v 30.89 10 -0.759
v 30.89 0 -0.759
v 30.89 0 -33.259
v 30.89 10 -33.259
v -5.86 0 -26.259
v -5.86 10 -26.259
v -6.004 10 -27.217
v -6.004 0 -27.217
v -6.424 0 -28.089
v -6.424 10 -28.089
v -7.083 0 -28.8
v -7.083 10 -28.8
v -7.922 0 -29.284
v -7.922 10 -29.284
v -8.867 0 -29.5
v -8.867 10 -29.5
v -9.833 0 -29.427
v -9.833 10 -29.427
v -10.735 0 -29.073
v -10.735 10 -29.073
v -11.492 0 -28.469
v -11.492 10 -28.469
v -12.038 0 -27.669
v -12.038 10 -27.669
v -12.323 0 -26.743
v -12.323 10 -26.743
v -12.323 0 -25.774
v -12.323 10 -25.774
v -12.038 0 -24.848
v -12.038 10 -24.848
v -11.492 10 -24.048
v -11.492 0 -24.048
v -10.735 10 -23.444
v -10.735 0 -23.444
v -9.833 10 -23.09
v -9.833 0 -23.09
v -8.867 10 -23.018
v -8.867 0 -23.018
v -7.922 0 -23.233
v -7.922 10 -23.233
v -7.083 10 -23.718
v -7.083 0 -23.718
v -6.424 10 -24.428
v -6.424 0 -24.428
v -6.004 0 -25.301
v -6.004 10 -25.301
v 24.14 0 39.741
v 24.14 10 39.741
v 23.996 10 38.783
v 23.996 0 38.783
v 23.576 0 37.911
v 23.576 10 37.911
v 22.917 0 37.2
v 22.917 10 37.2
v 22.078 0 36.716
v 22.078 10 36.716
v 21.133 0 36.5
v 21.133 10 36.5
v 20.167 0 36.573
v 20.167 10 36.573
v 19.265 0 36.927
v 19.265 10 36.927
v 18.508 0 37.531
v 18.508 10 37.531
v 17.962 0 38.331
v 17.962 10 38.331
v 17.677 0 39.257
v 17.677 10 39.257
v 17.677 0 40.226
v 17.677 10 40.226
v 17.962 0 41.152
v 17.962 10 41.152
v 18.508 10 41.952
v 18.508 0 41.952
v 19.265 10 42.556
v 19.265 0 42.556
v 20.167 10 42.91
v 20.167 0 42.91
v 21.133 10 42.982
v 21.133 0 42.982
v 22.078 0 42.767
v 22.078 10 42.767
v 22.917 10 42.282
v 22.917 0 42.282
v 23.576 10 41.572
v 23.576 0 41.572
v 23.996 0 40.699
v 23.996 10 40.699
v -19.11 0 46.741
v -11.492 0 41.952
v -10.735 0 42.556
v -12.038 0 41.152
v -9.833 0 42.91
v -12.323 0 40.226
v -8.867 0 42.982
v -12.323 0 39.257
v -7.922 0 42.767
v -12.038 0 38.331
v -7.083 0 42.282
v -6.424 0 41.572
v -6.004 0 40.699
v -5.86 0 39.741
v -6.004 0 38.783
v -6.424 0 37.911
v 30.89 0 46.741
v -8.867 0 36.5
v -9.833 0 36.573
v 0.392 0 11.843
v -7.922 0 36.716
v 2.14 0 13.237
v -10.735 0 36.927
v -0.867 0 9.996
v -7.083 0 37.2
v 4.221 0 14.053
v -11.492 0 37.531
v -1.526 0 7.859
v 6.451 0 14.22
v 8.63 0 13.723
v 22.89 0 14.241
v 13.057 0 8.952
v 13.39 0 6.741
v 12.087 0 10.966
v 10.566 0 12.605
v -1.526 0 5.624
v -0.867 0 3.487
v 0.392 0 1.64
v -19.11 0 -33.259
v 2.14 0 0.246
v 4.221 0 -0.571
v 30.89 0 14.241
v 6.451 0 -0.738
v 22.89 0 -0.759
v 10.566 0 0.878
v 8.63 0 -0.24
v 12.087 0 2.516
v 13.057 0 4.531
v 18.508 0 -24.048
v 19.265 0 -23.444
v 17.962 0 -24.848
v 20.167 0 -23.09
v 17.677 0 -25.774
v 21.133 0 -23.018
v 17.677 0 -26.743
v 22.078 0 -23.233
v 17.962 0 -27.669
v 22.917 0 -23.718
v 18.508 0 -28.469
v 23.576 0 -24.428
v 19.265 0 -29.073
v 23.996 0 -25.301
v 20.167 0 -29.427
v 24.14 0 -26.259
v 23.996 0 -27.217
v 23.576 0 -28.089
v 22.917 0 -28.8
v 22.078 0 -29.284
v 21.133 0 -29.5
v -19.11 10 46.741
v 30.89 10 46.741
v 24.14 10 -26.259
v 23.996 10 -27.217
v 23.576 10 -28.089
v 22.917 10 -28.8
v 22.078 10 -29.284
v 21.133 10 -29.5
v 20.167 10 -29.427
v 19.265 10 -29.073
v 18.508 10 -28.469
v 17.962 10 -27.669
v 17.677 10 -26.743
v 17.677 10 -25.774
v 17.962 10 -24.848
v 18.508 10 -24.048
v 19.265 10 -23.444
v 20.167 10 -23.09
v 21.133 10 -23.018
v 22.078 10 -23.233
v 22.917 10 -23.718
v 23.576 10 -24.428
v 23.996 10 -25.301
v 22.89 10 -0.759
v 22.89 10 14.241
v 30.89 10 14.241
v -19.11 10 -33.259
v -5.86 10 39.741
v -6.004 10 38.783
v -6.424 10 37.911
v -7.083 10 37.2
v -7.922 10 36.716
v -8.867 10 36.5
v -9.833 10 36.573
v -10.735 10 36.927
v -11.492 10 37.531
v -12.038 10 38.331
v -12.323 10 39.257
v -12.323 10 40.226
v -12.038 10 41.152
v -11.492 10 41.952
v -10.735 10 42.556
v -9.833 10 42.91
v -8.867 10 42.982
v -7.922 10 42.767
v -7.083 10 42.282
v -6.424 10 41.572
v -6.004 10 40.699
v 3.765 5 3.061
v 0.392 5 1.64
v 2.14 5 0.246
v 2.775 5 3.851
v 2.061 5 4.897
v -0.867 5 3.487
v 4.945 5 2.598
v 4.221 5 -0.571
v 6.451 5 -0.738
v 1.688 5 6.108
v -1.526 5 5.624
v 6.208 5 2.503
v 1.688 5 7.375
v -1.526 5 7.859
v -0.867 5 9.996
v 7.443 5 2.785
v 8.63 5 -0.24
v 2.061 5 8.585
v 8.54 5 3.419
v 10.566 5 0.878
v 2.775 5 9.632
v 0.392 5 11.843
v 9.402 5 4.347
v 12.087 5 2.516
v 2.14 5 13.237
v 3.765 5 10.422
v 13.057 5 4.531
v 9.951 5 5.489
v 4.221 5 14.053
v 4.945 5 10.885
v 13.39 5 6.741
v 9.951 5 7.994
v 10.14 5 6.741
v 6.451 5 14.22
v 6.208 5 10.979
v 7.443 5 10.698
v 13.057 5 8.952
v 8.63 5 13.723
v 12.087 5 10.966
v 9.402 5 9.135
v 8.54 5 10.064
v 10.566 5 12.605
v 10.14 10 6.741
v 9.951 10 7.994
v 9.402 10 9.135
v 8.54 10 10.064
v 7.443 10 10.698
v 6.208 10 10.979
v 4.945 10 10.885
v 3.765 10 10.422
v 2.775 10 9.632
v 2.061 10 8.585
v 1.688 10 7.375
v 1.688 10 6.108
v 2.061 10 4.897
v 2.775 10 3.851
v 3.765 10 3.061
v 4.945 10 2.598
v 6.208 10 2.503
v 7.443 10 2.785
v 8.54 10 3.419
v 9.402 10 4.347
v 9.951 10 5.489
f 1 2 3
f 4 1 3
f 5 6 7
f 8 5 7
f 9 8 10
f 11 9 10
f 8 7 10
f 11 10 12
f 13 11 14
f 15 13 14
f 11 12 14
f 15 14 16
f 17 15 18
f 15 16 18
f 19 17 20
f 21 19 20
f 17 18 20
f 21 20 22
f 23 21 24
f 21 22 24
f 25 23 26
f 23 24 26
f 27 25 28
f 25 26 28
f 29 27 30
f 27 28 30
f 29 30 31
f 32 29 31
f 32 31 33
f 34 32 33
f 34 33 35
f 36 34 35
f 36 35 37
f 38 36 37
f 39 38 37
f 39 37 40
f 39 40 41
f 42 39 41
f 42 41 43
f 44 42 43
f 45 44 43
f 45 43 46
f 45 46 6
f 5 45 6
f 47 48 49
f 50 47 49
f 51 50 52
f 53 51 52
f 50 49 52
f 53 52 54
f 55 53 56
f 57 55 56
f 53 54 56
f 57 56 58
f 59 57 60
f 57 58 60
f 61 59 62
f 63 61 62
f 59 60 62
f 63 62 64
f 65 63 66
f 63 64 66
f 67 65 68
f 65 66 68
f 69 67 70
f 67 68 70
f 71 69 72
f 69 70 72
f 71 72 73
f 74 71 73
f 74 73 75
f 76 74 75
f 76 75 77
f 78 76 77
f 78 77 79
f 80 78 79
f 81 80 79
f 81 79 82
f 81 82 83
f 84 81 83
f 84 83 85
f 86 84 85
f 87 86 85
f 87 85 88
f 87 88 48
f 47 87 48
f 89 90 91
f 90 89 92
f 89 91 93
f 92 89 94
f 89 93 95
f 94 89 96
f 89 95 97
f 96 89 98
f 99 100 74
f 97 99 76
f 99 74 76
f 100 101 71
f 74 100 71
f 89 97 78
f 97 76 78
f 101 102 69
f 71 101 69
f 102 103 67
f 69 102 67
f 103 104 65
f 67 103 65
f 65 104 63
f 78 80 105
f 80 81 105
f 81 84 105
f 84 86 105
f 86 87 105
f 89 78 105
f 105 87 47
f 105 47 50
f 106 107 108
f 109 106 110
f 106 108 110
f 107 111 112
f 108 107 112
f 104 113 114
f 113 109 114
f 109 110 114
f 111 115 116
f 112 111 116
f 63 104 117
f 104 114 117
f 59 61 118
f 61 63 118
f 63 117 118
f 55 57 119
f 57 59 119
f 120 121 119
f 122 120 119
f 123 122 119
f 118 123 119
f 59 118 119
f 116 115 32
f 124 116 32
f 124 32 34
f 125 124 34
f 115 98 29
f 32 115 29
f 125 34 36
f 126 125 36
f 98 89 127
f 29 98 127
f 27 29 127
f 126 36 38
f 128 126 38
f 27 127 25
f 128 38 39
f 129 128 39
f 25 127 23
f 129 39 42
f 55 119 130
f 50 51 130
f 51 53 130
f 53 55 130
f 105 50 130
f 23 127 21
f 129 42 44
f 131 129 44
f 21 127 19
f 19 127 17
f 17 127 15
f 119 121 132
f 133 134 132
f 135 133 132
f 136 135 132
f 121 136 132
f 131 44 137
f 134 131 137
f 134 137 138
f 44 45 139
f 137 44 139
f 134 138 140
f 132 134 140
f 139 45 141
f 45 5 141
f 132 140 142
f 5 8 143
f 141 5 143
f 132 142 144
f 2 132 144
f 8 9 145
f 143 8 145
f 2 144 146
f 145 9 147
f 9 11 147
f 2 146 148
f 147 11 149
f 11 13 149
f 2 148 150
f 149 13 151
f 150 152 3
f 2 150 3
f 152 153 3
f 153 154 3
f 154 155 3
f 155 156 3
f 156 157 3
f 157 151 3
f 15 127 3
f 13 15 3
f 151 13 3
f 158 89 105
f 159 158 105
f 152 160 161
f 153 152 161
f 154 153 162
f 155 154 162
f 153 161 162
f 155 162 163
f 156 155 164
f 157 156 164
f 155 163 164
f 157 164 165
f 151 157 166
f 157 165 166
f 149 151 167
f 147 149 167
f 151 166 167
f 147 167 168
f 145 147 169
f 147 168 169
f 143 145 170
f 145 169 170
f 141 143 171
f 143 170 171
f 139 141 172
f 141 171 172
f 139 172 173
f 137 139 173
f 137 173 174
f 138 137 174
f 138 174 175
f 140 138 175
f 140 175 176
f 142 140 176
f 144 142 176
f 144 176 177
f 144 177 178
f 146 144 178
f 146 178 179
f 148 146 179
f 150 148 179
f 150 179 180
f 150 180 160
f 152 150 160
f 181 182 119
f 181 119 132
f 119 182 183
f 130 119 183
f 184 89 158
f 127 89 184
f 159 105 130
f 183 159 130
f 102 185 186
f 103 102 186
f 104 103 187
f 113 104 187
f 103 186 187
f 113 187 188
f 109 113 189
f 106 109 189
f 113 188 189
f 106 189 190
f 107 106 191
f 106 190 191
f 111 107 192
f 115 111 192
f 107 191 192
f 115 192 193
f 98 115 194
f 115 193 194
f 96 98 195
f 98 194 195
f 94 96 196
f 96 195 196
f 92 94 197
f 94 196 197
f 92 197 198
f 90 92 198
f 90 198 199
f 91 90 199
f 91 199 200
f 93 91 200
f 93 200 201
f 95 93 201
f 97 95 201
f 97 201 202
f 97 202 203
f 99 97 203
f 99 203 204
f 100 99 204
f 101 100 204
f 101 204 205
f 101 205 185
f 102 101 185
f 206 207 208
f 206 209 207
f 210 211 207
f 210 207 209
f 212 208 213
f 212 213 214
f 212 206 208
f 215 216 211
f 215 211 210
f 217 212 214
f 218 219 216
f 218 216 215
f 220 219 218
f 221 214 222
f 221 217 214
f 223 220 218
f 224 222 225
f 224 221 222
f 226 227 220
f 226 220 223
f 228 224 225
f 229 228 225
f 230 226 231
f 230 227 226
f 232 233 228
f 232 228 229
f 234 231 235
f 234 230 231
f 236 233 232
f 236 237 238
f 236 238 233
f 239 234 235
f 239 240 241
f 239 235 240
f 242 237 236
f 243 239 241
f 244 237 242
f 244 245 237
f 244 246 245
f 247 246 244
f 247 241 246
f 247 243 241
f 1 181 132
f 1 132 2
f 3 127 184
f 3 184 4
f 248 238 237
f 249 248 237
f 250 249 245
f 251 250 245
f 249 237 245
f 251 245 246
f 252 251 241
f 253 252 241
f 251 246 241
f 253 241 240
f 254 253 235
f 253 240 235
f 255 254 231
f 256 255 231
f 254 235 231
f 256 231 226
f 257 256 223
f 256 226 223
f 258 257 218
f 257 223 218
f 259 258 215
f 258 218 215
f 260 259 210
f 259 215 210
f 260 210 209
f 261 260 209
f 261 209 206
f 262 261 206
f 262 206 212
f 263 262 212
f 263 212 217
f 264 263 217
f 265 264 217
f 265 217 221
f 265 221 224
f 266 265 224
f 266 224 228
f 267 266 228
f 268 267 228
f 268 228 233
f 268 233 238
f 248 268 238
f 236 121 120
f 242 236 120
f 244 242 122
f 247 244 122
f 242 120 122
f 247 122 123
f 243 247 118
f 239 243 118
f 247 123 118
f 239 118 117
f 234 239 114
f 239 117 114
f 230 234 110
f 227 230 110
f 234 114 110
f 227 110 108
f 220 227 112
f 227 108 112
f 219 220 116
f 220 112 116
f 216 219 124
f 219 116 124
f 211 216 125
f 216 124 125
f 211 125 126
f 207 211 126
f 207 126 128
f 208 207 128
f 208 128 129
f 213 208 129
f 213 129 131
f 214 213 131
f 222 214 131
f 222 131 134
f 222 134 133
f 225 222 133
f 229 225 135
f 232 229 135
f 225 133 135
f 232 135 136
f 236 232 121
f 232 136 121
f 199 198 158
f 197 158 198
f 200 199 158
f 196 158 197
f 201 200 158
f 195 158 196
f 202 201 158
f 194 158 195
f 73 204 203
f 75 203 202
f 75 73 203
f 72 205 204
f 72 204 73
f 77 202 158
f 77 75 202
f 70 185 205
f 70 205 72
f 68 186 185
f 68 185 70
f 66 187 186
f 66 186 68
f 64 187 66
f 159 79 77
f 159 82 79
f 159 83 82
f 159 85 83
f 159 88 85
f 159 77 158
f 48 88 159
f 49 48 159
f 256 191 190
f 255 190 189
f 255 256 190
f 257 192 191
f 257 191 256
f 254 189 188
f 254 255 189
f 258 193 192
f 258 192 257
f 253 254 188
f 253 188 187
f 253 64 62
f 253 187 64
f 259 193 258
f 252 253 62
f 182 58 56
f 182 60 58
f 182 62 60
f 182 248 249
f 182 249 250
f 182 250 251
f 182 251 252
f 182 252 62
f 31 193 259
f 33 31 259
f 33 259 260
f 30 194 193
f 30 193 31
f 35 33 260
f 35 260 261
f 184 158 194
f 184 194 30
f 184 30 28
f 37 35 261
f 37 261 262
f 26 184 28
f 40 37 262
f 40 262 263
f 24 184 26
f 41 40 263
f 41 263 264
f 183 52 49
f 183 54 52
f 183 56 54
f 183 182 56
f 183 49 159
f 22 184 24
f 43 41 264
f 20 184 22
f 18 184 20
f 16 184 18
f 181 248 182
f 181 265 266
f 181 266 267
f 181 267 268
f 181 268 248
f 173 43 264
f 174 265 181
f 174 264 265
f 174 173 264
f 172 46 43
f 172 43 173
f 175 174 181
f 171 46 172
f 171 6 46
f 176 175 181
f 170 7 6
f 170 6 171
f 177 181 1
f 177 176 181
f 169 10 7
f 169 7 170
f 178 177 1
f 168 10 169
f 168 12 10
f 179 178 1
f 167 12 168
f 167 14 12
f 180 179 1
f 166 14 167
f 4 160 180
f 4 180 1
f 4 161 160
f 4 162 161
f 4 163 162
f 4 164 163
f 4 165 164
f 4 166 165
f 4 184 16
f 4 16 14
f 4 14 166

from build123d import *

# Parameters (mm, degrees)
SKETCH1_W           = 50
SKETCH1_H           = 80
BOSS_EXTRUDE1_DEPTH = 10
CUT_EXTRUDE1_REACH  = 12
SKETCH2_R           = 4.25
CUT_EXTRUDE3_REACH  = 12
SKETCH5_R           = 3.25
SKETCH7_R           = 7.5
CUT_EXTRUDE4_DEPTH  = 5
SKETCH10_W          = 8
SKETCH10_H          = 15
CUT_EXTRUDE5_DEPTH  = 11


with BuildPart() as part:
    # Sketch1 → Boss-Extrude1 (new body)
    with BuildSketch(Plane(origin=(0, 0, 0), x_dir=(1, 0, 0), z_dir=(0, 1, 0))):
        with Locations((5.890258642, -6.741379093)):
            Rectangle(SKETCH1_W, SKETCH1_H)
    extrude(amount=BOSS_EXTRUDE1_DEPTH)

    # Sketch2 → Cut-Extrude1 (cut, up to next)
    with BuildSketch(Plane.XZ, mode=Mode.PRIVATE) as cut_extrude1_sk1:
        with Locations((5.890258642, 6.741379093)):
            Circle(SKETCH2_R)
    cut_extrude1_tool1 = extrude(cut_extrude1_sk1.sketch, amount=-CUT_EXTRUDE1_REACH, mode=Mode.PRIVATE) & part.part
    add(cut_extrude1_tool1.solids().sort_by_distance((5.890259, 0, 6.741379))[0], mode=Mode.SUBTRACT)

    # Sketch5 → Cut-Extrude3 (cut, up to next)
    with BuildSketch(Plane(origin=(0, 10, 0), x_dir=(1, 0, 0), z_dir=(0, 1, 0)), mode=Mode.PRIVATE) as cut_extrude3_sk1:
        with Locations((-9.109741358, -39.741379093)):
            Circle(SKETCH5_R)
    cut_extrude3_tool1 = extrude(cut_extrude3_sk1.sketch, amount=-CUT_EXTRUDE3_REACH, mode=Mode.PRIVATE) & part.part
    add(cut_extrude3_tool1.solids().sort_by_distance((-9.109741, 10, 39.741379))[0], mode=Mode.SUBTRACT)
    # Sketch5 → Cut-Extrude3 (cut, up to next)
    with BuildSketch(Plane(origin=(0, 10, 0), x_dir=(1, 0, 0), z_dir=(0, 1, 0)), mode=Mode.PRIVATE) as cut_extrude3_sk2:
        with Locations((20.890258642, -39.741379093)):
            Circle(SKETCH5_R)
    cut_extrude3_tool2 = extrude(cut_extrude3_sk2.sketch, amount=-CUT_EXTRUDE3_REACH, mode=Mode.PRIVATE) & part.part
    add(cut_extrude3_tool2.solids().sort_by_distance((20.890259, 10, 39.741379))[0], mode=Mode.SUBTRACT)
    # Sketch5 → Cut-Extrude3 (cut, up to next)
    with BuildSketch(Plane(origin=(0, 10, 0), x_dir=(1, 0, 0), z_dir=(0, 1, 0)), mode=Mode.PRIVATE) as cut_extrude3_sk3:
        with Locations((-9.109741358, 26.258620907)):
            Circle(SKETCH5_R)
    cut_extrude3_tool3 = extrude(cut_extrude3_sk3.sketch, amount=-CUT_EXTRUDE3_REACH, mode=Mode.PRIVATE) & part.part
    add(cut_extrude3_tool3.solids().sort_by_distance((-9.109741, 10, -26.258621))[0], mode=Mode.SUBTRACT)
    # Sketch5 → Cut-Extrude3 (cut, up to next)
    with BuildSketch(Plane(origin=(0, 10, 0), x_dir=(1, 0, 0), z_dir=(0, 1, 0)), mode=Mode.PRIVATE) as cut_extrude3_sk4:
        with Locations((20.890258642, 26.258620907)):
            Circle(SKETCH5_R)
    cut_extrude3_tool4 = extrude(cut_extrude3_sk4.sketch, amount=-CUT_EXTRUDE3_REACH, mode=Mode.PRIVATE) & part.part
    add(cut_extrude3_tool4.solids().sort_by_distance((20.890259, 10, -26.258621))[0], mode=Mode.SUBTRACT)

    # Sketch7 → Cut-Extrude4 (cut)
    with BuildSketch(Plane.XZ):
        with Locations((5.890258642, 6.741379093)):
            Circle(SKETCH7_R)
    extrude(amount=-CUT_EXTRUDE4_DEPTH, mode=Mode.SUBTRACT)

    # Sketch10 → Cut-Extrude5 (cut, through all)
    with BuildSketch(Plane(origin=(0, 10, 0), x_dir=(1, 0, 0), z_dir=(0, 1, 0))):
        with Locations((26.890258642, -6.741379093)):
            Rectangle(SKETCH10_W, SKETCH10_H)
    extrude(amount=-CUT_EXTRUDE5_DEPTH, mode=Mode.SUBTRACT)


solid = part.part
